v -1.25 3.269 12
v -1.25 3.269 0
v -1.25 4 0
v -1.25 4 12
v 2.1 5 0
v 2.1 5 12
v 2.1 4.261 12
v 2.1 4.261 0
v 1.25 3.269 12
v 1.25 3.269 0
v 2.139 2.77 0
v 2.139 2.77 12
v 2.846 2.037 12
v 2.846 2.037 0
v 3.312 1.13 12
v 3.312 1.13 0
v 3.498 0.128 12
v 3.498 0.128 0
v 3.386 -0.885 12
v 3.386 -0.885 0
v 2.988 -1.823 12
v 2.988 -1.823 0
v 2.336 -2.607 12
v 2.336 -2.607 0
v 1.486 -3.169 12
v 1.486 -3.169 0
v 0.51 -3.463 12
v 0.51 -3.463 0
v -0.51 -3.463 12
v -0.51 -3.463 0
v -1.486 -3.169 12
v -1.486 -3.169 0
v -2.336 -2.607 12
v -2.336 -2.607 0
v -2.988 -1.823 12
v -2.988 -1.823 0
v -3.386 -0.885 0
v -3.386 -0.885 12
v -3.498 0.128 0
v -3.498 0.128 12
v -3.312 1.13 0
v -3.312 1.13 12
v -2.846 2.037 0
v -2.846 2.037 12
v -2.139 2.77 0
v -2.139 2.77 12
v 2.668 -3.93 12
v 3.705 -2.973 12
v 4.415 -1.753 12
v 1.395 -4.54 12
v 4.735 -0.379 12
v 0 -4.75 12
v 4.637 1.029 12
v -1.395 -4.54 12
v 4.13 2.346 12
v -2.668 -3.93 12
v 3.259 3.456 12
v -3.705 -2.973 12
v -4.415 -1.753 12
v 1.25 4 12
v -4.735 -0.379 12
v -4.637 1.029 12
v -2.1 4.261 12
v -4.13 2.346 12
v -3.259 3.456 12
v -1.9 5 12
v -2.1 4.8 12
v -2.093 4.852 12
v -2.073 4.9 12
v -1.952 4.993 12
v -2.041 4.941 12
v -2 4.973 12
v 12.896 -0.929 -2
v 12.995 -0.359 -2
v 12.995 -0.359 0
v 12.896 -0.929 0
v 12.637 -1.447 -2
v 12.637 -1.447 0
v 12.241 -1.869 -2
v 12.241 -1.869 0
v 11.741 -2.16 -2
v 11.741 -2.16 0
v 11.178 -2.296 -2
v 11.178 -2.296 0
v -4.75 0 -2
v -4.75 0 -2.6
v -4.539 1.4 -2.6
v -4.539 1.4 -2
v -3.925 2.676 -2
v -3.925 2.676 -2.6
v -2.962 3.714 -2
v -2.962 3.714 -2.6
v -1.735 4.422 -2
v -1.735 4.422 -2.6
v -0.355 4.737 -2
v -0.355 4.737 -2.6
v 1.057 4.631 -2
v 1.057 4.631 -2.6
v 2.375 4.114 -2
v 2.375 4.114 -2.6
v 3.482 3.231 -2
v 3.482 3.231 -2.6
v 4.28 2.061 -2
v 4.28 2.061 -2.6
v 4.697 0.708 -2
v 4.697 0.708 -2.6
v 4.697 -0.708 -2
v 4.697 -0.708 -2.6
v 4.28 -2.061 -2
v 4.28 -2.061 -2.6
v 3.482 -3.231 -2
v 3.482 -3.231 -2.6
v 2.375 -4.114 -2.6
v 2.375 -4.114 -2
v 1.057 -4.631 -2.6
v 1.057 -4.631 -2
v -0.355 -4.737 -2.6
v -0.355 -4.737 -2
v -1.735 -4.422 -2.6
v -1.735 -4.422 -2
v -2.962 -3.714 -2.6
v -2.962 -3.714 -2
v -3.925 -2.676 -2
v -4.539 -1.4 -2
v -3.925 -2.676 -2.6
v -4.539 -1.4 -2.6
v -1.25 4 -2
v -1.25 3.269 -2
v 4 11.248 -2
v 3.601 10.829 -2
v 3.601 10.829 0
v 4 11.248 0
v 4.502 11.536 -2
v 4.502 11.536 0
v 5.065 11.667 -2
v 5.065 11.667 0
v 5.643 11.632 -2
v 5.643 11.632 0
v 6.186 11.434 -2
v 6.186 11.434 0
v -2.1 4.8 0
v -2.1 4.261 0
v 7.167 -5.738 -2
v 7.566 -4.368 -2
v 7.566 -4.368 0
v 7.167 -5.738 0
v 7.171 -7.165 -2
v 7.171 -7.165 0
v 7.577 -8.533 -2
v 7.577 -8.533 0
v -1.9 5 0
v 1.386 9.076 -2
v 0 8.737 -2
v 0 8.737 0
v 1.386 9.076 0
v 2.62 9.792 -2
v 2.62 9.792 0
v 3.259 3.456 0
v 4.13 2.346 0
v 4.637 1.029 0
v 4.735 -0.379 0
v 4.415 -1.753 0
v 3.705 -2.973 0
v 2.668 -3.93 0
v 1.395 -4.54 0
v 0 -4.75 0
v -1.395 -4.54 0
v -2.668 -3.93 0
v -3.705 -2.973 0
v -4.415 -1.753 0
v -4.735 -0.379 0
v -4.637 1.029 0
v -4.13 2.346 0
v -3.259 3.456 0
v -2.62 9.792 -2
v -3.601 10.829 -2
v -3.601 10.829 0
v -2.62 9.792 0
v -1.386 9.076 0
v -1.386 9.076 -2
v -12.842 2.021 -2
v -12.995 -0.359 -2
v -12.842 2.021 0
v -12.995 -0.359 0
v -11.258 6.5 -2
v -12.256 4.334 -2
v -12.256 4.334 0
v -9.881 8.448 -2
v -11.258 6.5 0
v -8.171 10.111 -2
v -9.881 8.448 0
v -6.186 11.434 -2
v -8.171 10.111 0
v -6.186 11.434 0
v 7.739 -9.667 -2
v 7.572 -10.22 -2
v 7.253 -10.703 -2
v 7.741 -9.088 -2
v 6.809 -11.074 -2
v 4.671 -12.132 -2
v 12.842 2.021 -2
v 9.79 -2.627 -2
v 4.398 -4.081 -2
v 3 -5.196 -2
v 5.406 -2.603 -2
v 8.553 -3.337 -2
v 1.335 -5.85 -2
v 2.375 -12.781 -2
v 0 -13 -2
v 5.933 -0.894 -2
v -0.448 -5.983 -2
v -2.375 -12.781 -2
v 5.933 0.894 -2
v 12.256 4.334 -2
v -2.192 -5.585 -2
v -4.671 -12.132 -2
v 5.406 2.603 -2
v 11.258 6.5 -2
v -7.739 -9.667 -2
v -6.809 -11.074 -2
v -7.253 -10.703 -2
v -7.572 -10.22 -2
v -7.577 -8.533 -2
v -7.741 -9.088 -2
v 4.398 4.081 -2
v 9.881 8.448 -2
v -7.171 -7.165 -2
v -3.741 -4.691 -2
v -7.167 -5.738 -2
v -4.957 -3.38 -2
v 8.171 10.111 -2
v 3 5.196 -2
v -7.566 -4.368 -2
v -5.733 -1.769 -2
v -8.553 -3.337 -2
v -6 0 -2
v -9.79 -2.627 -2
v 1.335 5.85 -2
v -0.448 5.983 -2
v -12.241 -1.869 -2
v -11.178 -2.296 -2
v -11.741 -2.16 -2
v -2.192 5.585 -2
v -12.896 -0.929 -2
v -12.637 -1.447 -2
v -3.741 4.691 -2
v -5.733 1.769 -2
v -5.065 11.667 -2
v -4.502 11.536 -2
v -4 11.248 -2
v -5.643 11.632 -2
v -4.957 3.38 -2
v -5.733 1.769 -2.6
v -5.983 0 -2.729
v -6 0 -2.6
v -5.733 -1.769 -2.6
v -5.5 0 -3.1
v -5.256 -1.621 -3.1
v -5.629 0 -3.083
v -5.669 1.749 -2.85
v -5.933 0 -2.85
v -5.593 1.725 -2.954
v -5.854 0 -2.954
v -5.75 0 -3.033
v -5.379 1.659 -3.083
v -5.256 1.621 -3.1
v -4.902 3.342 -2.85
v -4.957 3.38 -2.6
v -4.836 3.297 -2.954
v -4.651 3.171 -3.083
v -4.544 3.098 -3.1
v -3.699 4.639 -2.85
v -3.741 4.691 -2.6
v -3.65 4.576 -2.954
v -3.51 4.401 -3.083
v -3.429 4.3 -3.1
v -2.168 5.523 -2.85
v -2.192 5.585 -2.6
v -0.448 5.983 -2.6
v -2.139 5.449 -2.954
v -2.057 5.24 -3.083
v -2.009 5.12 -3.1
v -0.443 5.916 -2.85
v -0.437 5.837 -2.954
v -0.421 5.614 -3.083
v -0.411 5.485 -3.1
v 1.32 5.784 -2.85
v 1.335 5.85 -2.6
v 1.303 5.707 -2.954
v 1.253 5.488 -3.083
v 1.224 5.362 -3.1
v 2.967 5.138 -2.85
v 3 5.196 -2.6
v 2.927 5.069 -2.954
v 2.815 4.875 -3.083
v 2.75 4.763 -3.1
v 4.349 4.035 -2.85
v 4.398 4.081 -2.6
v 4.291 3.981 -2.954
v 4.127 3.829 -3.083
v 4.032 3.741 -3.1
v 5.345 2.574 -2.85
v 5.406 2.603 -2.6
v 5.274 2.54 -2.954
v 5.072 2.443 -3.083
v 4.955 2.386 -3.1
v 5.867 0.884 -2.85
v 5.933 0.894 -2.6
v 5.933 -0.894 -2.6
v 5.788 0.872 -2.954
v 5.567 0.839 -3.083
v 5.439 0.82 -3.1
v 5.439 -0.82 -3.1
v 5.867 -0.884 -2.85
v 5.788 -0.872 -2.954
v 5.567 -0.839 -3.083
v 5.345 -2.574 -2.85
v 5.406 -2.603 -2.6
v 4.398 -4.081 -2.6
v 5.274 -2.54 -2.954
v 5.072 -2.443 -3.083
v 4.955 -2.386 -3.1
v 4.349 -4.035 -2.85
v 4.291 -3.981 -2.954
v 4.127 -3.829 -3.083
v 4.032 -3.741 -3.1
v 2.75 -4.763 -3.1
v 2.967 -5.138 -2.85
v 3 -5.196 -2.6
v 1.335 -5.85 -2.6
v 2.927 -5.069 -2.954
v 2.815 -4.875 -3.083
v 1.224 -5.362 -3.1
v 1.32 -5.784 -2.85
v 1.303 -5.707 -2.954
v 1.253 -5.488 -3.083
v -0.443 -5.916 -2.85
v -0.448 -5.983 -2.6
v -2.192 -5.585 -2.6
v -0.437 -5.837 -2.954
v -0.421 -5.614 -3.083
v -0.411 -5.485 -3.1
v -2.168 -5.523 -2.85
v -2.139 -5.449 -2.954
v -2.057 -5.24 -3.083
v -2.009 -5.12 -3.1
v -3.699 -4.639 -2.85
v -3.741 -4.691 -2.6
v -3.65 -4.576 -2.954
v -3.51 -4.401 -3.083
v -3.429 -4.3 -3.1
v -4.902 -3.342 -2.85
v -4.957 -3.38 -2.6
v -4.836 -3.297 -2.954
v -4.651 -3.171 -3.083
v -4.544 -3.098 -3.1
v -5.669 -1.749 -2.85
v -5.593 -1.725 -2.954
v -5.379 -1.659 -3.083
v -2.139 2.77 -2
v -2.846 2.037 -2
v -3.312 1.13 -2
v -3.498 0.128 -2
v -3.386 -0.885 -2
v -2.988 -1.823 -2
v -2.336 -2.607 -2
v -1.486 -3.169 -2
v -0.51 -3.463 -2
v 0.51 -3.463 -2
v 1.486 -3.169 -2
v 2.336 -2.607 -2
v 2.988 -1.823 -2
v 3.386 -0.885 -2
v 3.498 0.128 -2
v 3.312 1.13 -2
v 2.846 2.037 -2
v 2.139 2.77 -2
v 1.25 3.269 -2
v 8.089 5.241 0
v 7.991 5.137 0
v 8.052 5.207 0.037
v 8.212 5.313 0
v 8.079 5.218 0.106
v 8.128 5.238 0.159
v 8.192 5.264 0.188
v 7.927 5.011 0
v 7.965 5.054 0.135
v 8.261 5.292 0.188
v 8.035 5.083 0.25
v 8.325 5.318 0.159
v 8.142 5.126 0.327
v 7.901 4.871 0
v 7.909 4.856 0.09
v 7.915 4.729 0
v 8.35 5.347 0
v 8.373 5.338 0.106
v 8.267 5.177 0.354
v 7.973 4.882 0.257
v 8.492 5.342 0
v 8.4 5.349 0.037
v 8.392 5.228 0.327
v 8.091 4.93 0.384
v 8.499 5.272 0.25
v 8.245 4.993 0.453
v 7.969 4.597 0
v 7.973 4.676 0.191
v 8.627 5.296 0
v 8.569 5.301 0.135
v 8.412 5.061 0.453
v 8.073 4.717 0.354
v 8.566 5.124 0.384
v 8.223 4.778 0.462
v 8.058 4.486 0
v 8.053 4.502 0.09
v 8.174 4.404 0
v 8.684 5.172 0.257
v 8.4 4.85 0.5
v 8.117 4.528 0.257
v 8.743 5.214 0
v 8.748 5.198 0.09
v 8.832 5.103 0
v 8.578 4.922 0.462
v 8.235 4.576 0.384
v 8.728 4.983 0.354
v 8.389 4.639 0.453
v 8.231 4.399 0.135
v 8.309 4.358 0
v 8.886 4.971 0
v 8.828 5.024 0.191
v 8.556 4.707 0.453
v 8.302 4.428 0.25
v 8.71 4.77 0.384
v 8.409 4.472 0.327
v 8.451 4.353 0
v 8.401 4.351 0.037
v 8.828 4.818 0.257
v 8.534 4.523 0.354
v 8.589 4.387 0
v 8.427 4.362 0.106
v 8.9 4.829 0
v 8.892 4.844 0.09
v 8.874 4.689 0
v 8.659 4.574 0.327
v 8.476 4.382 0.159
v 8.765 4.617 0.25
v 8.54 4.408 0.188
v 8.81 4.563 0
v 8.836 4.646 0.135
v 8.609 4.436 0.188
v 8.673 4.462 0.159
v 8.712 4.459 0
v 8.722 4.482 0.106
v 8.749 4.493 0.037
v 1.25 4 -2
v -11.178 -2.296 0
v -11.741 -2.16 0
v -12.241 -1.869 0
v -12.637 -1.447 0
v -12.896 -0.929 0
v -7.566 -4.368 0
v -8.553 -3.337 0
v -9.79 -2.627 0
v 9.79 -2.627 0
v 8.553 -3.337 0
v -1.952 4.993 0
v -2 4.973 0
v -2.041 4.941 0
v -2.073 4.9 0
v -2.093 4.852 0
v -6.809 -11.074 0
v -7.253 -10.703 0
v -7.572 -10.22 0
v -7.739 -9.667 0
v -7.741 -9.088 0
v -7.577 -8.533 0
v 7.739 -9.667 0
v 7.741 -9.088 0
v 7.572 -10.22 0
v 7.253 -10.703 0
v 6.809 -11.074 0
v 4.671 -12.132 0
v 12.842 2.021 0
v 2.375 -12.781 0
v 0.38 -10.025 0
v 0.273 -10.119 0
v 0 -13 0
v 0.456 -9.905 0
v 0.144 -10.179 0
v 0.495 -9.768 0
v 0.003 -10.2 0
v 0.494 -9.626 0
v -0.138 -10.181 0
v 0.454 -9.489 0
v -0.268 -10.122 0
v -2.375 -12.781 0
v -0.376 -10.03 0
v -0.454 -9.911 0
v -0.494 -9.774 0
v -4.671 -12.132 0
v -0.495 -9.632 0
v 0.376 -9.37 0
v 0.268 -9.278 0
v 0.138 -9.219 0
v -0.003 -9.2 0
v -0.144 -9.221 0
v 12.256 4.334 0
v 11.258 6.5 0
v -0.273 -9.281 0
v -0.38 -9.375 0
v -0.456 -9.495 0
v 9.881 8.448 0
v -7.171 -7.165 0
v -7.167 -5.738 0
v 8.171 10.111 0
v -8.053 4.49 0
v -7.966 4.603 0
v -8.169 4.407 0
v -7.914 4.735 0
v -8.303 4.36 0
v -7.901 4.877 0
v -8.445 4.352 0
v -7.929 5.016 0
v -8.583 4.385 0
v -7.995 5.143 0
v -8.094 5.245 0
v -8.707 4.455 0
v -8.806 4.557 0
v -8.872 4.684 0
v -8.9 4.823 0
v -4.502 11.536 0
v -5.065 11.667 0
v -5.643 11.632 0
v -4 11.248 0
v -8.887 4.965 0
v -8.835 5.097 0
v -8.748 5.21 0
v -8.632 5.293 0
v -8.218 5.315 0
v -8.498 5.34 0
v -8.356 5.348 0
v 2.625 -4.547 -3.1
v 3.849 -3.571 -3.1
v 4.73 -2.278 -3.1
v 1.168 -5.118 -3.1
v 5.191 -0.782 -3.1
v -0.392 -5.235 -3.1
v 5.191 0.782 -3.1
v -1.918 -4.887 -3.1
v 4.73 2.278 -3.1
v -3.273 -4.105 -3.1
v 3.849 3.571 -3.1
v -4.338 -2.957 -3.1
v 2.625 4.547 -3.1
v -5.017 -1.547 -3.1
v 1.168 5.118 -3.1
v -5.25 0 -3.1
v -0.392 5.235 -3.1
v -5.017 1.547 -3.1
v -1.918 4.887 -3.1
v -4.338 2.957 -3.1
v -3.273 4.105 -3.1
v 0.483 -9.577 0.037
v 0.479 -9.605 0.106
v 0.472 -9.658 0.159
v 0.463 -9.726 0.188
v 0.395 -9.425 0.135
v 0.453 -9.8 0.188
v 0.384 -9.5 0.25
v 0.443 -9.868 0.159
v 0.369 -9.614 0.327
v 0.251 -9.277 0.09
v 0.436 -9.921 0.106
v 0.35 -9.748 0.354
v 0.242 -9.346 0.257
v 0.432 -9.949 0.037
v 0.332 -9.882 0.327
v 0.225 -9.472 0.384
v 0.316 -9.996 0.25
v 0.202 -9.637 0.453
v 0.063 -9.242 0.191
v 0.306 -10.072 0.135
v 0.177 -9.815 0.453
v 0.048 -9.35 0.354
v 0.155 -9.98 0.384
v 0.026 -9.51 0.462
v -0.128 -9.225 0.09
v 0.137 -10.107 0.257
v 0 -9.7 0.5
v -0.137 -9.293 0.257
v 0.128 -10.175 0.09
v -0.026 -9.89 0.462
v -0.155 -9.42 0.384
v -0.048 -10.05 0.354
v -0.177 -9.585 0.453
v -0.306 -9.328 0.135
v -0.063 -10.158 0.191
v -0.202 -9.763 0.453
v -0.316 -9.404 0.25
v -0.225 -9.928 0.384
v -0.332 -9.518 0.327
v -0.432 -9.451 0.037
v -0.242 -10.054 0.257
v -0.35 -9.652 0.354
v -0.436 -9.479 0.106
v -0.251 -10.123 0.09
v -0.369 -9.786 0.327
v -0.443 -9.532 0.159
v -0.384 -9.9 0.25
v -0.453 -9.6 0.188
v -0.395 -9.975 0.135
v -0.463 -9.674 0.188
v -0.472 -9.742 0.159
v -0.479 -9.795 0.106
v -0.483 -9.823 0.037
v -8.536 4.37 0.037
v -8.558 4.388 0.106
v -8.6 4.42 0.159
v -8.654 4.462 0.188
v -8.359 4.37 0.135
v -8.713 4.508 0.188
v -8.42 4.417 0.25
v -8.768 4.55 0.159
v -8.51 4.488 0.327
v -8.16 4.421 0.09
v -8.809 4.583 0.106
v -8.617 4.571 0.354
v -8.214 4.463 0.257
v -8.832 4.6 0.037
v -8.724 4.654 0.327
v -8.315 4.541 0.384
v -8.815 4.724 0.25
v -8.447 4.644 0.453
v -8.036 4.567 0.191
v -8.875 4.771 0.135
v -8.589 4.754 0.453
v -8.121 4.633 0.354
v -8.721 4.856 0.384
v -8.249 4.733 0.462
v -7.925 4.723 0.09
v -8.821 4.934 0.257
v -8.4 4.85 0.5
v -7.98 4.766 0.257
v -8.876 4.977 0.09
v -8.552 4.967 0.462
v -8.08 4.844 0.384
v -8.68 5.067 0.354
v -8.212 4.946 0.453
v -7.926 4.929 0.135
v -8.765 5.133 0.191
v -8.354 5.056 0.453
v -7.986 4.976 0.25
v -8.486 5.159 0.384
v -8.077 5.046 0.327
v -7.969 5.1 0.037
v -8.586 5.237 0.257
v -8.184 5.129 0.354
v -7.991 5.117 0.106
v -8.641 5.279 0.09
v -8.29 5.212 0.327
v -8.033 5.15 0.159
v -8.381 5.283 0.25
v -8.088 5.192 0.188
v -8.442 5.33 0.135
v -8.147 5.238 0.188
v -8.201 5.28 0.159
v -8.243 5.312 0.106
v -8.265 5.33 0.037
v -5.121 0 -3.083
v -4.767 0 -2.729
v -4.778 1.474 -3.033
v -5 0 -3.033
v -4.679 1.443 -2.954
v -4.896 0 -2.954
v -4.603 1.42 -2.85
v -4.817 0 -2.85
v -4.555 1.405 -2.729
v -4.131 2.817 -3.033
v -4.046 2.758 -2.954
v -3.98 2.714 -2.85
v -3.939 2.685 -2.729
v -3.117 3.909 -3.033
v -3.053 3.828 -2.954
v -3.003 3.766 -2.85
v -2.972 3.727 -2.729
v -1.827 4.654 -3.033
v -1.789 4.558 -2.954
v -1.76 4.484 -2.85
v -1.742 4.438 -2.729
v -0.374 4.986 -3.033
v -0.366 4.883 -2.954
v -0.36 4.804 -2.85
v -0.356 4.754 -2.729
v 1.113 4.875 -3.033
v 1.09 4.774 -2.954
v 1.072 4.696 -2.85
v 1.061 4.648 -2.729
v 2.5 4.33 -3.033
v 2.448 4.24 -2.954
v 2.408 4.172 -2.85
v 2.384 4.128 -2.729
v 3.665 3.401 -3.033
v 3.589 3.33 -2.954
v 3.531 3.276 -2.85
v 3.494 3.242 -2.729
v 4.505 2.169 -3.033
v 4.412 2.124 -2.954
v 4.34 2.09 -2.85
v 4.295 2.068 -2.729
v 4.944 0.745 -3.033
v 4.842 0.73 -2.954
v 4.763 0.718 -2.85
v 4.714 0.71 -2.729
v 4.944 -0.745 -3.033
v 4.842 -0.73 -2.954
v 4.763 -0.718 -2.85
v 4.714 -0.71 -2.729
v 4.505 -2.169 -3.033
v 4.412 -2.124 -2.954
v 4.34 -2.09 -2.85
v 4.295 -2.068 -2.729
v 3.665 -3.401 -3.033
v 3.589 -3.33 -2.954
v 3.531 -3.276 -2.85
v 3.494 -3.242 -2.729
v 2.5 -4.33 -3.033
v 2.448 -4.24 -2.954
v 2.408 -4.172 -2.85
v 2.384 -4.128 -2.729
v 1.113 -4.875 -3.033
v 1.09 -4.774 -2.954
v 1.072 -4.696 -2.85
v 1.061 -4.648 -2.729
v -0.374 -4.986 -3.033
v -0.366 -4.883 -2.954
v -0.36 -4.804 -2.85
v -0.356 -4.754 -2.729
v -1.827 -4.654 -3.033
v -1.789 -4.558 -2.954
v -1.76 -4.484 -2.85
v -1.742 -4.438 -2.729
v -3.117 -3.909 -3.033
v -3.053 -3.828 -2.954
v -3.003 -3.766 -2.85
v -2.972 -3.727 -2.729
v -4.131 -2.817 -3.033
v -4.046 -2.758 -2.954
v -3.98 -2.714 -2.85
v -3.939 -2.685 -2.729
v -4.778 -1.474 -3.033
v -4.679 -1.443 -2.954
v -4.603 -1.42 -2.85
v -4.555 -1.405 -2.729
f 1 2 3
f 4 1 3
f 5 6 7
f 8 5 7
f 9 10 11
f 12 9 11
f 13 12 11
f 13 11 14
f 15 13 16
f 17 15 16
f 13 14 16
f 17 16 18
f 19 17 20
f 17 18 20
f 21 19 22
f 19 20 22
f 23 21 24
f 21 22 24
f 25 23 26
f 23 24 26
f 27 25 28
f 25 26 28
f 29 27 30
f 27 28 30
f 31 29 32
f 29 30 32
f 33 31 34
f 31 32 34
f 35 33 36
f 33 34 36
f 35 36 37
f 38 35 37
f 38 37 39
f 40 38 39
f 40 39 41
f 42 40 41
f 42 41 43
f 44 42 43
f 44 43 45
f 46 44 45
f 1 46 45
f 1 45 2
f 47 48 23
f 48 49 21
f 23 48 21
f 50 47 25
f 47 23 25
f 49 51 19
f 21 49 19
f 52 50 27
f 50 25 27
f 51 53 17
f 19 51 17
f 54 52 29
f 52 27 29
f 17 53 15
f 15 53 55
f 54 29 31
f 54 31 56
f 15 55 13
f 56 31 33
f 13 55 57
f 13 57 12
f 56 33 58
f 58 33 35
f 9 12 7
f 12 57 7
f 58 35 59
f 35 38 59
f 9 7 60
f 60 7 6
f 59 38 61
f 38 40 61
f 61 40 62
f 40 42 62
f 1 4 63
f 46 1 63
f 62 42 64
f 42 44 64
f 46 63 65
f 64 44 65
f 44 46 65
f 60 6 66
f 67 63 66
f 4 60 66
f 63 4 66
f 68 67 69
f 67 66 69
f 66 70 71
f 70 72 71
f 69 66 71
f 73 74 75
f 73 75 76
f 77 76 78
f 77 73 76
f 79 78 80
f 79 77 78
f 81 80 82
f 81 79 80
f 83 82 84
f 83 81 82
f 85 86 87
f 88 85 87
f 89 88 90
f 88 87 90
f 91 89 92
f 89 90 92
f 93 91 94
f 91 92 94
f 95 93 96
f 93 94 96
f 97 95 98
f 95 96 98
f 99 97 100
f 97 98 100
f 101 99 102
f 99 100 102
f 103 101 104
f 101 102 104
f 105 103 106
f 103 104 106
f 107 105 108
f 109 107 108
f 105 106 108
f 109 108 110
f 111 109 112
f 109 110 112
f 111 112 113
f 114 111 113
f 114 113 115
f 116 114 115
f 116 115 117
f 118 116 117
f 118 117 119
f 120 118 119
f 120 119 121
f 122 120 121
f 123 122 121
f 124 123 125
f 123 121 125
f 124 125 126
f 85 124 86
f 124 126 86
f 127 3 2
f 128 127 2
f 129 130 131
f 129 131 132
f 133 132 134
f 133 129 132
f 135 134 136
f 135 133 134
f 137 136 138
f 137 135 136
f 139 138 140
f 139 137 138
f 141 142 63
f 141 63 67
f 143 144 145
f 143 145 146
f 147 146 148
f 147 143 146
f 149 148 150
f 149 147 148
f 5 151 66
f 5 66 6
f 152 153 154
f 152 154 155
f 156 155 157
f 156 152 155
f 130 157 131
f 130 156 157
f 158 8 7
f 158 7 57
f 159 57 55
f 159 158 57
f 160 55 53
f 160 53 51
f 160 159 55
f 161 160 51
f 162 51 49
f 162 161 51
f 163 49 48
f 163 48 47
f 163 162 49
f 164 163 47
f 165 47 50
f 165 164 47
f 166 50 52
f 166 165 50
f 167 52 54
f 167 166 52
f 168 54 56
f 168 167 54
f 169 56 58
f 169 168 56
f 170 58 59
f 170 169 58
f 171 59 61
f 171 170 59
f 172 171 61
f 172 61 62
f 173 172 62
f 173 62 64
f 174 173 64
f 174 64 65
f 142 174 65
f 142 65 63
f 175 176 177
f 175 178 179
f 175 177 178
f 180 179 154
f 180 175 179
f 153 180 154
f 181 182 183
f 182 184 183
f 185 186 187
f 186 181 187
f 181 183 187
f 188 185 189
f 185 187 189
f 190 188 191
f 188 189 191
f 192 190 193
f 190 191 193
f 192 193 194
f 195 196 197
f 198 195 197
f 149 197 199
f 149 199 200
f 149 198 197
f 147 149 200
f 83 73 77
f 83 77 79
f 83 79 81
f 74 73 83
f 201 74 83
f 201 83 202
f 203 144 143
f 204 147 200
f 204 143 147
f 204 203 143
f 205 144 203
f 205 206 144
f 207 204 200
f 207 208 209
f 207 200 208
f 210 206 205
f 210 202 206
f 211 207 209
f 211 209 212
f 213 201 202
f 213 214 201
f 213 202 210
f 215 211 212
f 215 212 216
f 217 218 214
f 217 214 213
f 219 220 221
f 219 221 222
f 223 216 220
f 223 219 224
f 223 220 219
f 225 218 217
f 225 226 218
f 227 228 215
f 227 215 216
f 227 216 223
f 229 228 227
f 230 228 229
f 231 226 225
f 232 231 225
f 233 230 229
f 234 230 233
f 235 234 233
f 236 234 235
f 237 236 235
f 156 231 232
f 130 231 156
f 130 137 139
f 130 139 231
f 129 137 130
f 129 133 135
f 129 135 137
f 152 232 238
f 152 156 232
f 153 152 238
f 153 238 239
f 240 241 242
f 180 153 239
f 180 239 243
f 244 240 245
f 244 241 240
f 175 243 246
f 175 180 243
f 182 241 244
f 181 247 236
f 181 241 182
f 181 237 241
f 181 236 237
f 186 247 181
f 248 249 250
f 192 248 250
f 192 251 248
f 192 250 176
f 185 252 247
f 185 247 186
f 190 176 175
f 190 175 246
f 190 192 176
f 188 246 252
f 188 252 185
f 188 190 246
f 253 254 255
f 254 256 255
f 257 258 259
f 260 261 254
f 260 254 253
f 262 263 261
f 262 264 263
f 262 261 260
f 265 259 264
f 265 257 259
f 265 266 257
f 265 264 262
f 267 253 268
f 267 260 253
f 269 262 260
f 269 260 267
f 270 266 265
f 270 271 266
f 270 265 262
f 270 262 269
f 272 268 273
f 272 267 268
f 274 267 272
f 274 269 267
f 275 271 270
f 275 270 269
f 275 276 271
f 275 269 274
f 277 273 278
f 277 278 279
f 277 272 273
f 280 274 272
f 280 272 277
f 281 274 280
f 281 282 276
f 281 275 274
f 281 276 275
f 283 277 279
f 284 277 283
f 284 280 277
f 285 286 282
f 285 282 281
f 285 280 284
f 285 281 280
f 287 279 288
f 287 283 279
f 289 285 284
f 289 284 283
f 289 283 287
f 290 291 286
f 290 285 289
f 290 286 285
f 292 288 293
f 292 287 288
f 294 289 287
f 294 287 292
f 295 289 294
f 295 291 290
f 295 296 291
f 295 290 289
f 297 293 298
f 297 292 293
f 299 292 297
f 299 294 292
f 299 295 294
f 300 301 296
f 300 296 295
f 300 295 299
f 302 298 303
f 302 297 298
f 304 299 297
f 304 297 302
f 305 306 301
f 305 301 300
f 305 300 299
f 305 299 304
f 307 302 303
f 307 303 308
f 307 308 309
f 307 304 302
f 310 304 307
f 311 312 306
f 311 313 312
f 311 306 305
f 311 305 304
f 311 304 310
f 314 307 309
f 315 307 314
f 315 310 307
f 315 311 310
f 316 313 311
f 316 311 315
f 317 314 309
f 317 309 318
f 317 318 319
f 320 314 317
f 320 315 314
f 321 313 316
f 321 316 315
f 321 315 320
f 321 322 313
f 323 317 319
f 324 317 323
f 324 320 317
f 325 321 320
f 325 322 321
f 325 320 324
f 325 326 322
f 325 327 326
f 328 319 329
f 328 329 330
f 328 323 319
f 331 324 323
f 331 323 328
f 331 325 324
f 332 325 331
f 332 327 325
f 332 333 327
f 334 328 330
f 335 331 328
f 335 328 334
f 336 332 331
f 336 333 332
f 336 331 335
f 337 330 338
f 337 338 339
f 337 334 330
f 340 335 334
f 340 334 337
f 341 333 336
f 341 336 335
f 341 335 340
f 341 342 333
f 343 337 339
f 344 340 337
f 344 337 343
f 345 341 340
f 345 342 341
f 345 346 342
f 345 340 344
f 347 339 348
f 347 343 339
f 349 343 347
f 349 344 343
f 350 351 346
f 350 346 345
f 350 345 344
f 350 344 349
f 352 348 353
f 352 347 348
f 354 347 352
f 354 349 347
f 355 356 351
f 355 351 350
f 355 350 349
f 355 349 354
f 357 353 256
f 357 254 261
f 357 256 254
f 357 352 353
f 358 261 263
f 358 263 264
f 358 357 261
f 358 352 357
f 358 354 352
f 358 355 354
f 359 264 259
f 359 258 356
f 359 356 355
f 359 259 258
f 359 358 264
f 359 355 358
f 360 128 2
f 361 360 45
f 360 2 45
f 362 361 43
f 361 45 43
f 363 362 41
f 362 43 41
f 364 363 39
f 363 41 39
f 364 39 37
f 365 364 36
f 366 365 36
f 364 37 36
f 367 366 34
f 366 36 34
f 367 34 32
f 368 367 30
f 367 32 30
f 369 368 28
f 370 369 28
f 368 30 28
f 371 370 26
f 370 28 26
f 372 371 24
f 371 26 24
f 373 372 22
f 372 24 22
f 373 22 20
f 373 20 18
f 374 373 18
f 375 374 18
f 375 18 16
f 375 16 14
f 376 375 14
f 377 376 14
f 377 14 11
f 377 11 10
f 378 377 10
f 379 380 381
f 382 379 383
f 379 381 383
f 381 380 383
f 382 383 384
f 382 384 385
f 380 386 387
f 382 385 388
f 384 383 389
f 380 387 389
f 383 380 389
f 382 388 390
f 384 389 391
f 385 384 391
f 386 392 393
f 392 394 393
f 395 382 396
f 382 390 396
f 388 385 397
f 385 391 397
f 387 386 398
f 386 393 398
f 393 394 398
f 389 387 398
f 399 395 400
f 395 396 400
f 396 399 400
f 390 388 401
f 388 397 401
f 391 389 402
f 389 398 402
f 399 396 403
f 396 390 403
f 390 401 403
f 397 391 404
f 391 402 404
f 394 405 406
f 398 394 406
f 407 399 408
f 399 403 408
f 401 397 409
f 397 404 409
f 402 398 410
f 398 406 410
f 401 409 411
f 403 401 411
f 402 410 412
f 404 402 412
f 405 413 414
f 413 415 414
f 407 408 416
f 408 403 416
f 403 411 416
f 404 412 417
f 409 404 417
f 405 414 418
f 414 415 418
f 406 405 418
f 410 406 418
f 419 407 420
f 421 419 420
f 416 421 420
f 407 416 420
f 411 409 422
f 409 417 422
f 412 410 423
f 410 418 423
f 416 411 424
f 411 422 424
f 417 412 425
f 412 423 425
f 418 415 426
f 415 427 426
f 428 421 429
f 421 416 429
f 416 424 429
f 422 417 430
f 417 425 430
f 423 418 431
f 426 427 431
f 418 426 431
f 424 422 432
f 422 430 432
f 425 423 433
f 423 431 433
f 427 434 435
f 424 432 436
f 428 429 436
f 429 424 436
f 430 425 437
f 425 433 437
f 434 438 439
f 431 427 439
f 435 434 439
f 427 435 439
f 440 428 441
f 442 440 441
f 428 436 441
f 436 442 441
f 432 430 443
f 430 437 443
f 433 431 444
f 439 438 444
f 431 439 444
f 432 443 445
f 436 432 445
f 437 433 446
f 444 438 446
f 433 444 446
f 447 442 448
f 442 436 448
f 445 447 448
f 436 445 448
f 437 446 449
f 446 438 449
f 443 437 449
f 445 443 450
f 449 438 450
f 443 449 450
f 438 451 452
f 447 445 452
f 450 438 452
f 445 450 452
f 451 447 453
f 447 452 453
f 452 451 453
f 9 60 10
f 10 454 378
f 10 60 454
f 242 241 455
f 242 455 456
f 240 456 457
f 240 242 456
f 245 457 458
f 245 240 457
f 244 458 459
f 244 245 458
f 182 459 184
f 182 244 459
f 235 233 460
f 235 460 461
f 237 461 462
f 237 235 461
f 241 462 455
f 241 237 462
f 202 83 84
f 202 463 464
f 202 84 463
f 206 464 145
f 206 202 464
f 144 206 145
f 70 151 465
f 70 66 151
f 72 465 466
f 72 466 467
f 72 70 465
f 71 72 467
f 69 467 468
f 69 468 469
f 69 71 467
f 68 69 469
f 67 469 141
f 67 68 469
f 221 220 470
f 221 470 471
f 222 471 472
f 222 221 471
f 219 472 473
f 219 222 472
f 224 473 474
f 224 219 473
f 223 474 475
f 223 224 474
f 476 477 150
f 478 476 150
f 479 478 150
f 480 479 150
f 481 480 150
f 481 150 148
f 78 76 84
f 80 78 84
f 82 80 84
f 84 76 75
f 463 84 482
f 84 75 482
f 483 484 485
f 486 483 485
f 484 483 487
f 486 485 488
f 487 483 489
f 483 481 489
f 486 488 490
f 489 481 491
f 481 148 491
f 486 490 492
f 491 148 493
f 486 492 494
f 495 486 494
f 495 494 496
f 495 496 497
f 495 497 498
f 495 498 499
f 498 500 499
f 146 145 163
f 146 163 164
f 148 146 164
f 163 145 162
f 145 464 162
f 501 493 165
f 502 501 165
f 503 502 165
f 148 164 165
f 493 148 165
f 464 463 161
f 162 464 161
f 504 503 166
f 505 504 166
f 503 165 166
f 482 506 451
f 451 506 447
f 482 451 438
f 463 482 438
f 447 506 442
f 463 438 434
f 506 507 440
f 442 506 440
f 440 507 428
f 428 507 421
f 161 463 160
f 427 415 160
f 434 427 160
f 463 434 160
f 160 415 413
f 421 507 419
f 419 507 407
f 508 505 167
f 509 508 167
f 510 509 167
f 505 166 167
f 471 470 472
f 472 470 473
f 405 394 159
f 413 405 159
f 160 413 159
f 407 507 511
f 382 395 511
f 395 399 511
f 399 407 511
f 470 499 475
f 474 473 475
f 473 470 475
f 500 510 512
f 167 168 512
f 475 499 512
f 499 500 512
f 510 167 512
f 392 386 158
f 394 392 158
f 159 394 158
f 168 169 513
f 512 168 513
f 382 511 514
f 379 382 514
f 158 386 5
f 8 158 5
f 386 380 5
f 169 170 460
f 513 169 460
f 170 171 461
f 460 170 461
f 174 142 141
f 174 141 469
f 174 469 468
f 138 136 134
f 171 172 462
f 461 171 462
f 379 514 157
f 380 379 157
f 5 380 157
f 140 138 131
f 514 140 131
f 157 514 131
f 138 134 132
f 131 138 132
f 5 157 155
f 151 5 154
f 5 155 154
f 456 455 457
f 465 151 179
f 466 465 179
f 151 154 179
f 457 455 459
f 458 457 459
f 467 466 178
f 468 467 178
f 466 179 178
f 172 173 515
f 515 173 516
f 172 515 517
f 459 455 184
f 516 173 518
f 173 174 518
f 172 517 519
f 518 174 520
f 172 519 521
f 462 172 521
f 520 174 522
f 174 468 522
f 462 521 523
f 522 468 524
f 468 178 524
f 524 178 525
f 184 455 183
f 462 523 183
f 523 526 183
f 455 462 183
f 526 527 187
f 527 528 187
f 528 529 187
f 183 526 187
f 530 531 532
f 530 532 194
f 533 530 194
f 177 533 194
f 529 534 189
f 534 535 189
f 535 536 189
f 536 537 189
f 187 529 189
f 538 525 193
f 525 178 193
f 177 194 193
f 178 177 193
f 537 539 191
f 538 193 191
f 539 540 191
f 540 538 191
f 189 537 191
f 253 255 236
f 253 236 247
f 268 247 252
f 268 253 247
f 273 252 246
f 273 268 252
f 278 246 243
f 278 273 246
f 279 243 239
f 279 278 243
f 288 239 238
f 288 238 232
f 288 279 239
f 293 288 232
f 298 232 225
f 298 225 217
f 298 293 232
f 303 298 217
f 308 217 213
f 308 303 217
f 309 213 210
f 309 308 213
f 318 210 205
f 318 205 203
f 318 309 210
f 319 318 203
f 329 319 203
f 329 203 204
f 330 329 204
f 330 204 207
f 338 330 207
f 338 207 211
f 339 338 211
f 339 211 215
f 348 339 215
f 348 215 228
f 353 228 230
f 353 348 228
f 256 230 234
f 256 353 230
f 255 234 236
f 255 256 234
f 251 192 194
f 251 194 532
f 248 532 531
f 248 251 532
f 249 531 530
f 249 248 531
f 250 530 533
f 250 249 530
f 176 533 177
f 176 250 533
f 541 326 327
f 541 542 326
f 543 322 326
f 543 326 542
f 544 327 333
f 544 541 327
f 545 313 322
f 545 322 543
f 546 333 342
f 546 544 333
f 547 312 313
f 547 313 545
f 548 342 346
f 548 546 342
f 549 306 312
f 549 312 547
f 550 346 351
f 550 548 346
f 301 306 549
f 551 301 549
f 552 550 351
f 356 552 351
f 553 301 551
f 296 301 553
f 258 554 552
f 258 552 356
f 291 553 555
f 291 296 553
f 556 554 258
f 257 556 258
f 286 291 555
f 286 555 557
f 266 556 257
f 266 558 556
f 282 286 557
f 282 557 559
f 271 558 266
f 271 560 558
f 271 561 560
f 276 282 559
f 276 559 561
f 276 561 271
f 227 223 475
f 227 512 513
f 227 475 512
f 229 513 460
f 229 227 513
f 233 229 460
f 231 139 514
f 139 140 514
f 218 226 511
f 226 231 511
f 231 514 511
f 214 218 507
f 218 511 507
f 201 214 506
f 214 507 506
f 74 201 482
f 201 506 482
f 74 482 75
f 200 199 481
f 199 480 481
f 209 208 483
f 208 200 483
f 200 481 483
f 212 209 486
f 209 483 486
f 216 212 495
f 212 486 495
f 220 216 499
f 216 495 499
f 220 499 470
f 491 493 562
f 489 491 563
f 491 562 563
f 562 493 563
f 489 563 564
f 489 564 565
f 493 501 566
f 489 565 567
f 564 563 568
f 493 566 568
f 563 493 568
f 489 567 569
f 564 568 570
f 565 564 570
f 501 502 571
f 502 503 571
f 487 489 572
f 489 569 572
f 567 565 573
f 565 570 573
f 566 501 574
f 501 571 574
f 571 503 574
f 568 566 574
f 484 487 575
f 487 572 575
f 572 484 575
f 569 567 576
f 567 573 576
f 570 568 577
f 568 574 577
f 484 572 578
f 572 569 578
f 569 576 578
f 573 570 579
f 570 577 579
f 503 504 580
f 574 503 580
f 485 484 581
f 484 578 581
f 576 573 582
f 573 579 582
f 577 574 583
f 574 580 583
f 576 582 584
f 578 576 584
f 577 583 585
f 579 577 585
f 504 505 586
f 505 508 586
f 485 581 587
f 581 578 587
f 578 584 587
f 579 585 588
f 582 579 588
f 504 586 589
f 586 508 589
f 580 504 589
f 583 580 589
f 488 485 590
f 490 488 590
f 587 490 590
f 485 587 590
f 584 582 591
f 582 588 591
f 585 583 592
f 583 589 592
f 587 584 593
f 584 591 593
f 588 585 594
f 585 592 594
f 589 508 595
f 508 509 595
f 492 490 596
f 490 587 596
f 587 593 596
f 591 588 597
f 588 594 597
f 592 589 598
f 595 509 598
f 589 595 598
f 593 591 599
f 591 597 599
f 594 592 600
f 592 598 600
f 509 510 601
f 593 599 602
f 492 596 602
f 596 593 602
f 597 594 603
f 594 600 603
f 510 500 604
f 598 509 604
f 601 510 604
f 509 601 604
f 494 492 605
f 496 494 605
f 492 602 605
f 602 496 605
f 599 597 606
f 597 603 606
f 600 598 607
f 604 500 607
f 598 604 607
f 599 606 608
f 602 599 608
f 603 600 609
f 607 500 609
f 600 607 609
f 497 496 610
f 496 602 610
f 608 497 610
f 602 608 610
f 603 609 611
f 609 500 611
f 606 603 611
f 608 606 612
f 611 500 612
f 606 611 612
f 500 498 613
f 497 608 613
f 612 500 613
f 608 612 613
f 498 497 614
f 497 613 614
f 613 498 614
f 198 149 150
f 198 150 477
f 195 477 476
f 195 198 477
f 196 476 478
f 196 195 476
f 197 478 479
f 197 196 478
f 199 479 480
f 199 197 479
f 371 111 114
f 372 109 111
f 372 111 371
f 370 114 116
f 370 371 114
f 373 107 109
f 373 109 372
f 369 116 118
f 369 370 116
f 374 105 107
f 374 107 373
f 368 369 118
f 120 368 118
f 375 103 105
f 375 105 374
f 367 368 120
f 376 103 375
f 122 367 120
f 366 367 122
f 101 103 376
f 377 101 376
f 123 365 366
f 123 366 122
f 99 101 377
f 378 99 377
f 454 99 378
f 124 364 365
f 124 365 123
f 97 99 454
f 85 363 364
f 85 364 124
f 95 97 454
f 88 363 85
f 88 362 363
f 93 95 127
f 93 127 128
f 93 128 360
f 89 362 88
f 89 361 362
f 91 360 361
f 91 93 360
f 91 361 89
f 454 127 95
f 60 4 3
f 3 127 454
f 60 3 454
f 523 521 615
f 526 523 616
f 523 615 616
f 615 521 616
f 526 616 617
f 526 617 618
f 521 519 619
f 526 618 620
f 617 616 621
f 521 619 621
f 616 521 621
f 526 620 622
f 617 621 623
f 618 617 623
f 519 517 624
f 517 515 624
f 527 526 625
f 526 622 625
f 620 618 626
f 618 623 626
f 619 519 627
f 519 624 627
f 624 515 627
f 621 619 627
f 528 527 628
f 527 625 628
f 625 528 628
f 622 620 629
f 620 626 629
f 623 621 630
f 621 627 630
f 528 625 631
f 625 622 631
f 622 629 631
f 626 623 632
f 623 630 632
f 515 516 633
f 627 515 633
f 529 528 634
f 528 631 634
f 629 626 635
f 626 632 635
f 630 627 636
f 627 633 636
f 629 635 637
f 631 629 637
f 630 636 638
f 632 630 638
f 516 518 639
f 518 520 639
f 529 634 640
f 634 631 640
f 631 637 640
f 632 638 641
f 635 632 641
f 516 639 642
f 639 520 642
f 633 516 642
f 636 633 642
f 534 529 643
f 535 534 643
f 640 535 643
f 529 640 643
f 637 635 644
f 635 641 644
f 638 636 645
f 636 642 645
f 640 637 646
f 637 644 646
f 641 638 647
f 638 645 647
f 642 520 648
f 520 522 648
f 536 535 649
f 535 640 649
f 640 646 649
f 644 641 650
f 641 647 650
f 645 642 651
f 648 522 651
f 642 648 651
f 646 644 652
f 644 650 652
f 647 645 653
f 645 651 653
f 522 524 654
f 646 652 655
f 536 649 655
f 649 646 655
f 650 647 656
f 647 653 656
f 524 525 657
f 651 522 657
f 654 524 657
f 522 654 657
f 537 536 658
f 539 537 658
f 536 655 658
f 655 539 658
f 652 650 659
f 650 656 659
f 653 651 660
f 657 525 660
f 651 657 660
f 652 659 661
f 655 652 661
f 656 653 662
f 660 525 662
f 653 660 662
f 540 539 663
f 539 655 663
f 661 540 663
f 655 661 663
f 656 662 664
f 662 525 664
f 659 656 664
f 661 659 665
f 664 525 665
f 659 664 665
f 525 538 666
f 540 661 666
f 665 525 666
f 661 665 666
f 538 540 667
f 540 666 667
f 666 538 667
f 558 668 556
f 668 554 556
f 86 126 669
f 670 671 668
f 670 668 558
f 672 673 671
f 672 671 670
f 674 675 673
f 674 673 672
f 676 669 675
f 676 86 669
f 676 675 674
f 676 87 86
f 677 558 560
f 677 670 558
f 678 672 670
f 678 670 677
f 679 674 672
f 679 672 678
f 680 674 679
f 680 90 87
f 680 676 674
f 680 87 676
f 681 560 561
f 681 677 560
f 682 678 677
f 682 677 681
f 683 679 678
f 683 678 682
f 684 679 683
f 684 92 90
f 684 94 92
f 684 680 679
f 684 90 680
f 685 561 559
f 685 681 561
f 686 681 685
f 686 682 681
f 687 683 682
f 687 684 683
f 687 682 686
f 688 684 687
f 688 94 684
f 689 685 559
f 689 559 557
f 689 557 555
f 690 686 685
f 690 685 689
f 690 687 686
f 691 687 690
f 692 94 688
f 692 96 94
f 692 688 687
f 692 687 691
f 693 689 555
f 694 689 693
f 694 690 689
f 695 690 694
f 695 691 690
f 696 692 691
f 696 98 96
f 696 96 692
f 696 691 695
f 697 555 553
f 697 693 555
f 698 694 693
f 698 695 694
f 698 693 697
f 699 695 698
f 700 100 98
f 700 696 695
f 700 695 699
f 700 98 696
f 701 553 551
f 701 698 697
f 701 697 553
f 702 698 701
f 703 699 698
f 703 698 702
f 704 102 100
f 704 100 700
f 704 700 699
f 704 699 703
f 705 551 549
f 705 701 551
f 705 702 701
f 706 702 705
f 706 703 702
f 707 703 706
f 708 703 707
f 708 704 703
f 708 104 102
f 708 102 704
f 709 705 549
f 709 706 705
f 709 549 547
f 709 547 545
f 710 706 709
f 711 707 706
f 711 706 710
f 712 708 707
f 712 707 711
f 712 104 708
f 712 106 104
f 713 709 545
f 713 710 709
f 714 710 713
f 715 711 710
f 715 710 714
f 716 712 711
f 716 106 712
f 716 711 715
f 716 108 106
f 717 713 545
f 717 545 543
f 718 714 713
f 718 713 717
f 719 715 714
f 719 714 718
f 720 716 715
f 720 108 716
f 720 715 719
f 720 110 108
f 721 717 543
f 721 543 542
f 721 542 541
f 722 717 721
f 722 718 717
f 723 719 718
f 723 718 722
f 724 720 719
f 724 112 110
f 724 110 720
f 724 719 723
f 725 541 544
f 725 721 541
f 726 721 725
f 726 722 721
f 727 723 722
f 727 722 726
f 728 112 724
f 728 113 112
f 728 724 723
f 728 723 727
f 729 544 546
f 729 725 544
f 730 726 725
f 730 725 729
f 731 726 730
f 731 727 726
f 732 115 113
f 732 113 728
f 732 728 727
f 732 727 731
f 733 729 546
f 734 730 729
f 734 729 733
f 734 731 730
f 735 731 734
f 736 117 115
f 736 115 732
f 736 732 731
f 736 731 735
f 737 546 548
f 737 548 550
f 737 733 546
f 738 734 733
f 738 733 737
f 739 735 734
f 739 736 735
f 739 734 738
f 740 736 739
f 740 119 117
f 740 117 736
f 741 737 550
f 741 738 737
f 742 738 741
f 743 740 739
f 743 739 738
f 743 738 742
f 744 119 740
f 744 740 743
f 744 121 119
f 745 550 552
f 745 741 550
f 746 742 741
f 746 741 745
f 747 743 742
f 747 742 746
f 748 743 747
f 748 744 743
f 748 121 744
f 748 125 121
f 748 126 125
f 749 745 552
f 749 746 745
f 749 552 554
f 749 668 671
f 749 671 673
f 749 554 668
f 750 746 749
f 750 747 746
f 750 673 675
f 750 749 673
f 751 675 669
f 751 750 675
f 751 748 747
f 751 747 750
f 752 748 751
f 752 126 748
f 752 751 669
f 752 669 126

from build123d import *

# Parameters (mm, degrees)
BOSS_EXTRU_1_DEPTH           = 12
ESQUISSE3_R                  = 13
BOSS_EXTRU_5_DEPTH           = 2
BOSS_EXTRU_6_START           = 1.1
ESQUISSE4_R                  = 6
ESQUISSE4_R_2                = 4.75
BOSS_EXTRU_6_DEPTH           = 1.1
ENL_V_MAT_EXTRU_2_REACH      = 23.954
CONG_1_R                     = 0.5
CONG_2_R                     = 0.5
ENL_V_MAT_EXTRU_3_REACH      = 25.108
R_P_TITION_CIRCULAIRE1_COUNT = 2
R_P_TITION_CIRCULAIRE1_ANGLE = 120
R_P_TITION_CIRCULAIRE2_COUNT = 2
R_P_TITION_CIRCULAIRE2_ANGLE = 240
CONG_3_R                     = 0.2
R_P_TITION_CIRCULAIRE3_COUNT = 2
R_P_TITION_CIRCULAIRE3_ANGLE = 240
R_P_TITION_CIRCULAIRE4_COUNT = 2
R_P_TITION_CIRCULAIRE4_ANGLE = 120


with BuildPart() as part:
    # Esquisse1 → Boss.-Extru.1 (new body)
    with BuildSketch(Plane.XY):
        with BuildLine():
            Line((-2.1, 5), (2.1, 5))
            Line((2.1, 5), (2.1, 4.260575079))
            ThreePointArc((2.1, 4.260575079), (0, -4.75), (-2.1, 4.260575079))
            Line((-2.1, 4.260575079), (-2.1, 5))
        make_face()
        with BuildLine():
            Line((-1.25, 4), (1.25, 4))
            Line((1.25, 4), (1.25, 3.269174208))
            ThreePointArc((1.25, 3.269174208), (0, -3.5), (-1.25, 3.269174208))
            Line((-1.25, 3.269174208), (-1.25, 4))
        make_face(mode=Mode.SUBTRACT)
    extrude(amount=BOSS_EXTRU_1_DEPTH)

    # Esquisse3 → Boss.-Extru.5 (add)
    with BuildSketch(Plane(origin=(0, 0, 0), x_dir=(-1, 0, 0), z_dir=(0, 0, -1))):
        Circle(ESQUISSE3_R)
    extrude(amount=BOSS_EXTRU_5_DEPTH)

    # Esquisse4 → Boss.-Extru.6 (add)
    with BuildSketch(Plane(origin=(0, 0, -2), x_dir=(-1, 0, 0), z_dir=(0, 0, -1)).offset(BOSS_EXTRU_6_START)):
        Circle(ESQUISSE4_R)
        Circle(ESQUISSE4_R_2, mode=Mode.SUBTRACT)
    extrude(amount=-BOSS_EXTRU_6_DEPTH)

    # Esquisse5 → Enlèv. mat.-Extru.2 (cut, up to next)
    with BuildSketch(Plane.XY, mode=Mode.PRIVATE) as enl_v_mat_extru_2_sk1:
        with BuildLine():
            Line((1.25, 4), (-1.25, 4))
            Line((-1.25, 4), (-1.25, 3.269174208))
            ThreePointArc((-1.25, 3.269174208), (0, -3.5), (1.25, 3.269174208))
            Line((1.25, 3.269174208), (1.25, 4))
        make_face()
    enl_v_mat_extru_2_tool1 = extrude(enl_v_mat_extru_2_sk1.sketch, amount=-ENL_V_MAT_EXTRU_2_REACH, mode=Mode.PRIVATE) & part.part
    add(enl_v_mat_extru_2_tool1.solids().sort_by_distance((0, 0.133717, 0))[0], mode=Mode.SUBTRACT)

    # Congé1
    cong_1_edges = [part.edges().sort_by_distance(p)[0] for p in [
        (6, 0, -3.1),
    ]]
    fillet(cong_1_edges, radius=CONG_1_R)

    # Congé2
    cong_2_edges = [part.edges().sort_by_distance(p)[0] for p in [
        (4.75, 0, -3.1),
    ]]
    fillet(cong_2_edges, radius=CONG_2_R)

    # Esquisse6 → Enlèv. mat.-Extru.3 (cut, up to next)
    with BuildSketch(Plane(origin=(0, 0, -2), x_dir=(-1, 0, 0), z_dir=(0, 0, -1)), mode=Mode.PRIVATE) as enl_v_mat_extru_3_sk1:
        with BuildLine():
            ThreePointArc((3.60109047, 10.828515139), (2.028708414, 9.38979217), (0, 8.736606683))
            ThreePointArc((0, 8.736606683), (-2.028708414, 9.38979217), (-3.60109047, 10.828515139))
            ThreePointArc((-3.60109047, 10.828515139), (-4.778846502, 11.621991896), (-6.186412192, 11.433647895))
            ThreePointArc((-6.186412192, 11.433647895), (0, 13), (6.186412192, 11.433647895))
            ThreePointArc((6.186412192, 11.433647895), (4.778846502, 11.621991896), (3.60109047, 10.828515139))
        make_face()
    enl_v_mat_extru_3_tool1 = extrude(enl_v_mat_extru_3_sk1.sketch, amount=-ENL_V_MAT_EXTRU_3_REACH, mode=Mode.PRIVATE) & part.part
    enl_v_mat_extru_3 = enl_v_mat_extru_3_tool1.solids().sort_by_distance((0, 11.154072, -2))[0]
    add(enl_v_mat_extru_3, mode=Mode.SUBTRACT)

    # Esquisse7 → Révolution2 (revolve)
    with BuildSketch(Plane.XY):
        with BuildLine():
            Line((-0.495343696, -9.631921937), (0.495343696, -9.768078063))
            ThreePointArc((0.495343696, -9.768078063), (0.068078063, -9.204656304), (-0.495343696, -9.631921937))
        make_face()
    r_volution2 = revolve(axis=Axis((-0.495343696, -9.631921937, 0), (0.9906873922487173, -0.1361561267054709, 0)))

    # Répétition circulaire1: Révolution2 ×2 about axis
    r_p_tition_circulaire1_axis = Axis((0, 0, 0), (0, 0, -1))
    for i in range(1, R_P_TITION_CIRCULAIRE1_COUNT):
        add(r_volution2.rotate(r_p_tition_circulaire1_axis, i * R_P_TITION_CIRCULAIRE1_ANGLE / (R_P_TITION_CIRCULAIRE1_COUNT - 1)))

    # Répétition circulaire2: Révolution2 ×2 about axis
    r_p_tition_circulaire2_axis = Axis((0, 0, 0), (0, 0, -1))
    for i in range(1, R_P_TITION_CIRCULAIRE2_COUNT):
        add(r_volution2.rotate(r_p_tition_circulaire2_axis, i * R_P_TITION_CIRCULAIRE2_ANGLE / (R_P_TITION_CIRCULAIRE2_COUNT - 1)))

    # Congé3
    cong_3_edges = [part.edges().sort_by_distance(p)[0] for p in [
        (-2.1, 5, 6),
    ]]
    fillet(cong_3_edges, radius=CONG_3_R)

    # Répétition circulaire3: Enlèv. mat.-Extru.3 ×2 about axis
    r_p_tition_circulaire3_axis = Axis((0, 0, 0), (0, 0, -1))
    for i in range(1, R_P_TITION_CIRCULAIRE3_COUNT):
        add(enl_v_mat_extru_3.rotate(r_p_tition_circulaire3_axis, i * R_P_TITION_CIRCULAIRE3_ANGLE / (R_P_TITION_CIRCULAIRE3_COUNT - 1)), mode=Mode.SUBTRACT)

    # Répétition circulaire4: Enlèv. mat.-Extru.3 ×2 about axis
    r_p_tition_circulaire4_axis = Axis((0, 0, 0), (0, 0, -1))
    for i in range(1, R_P_TITION_CIRCULAIRE4_COUNT):
        add(enl_v_mat_extru_3.rotate(r_p_tition_circulaire4_axis, i * R_P_TITION_CIRCULAIRE4_ANGLE / (R_P_TITION_CIRCULAIRE4_COUNT - 1)), mode=Mode.SUBTRACT)


solid = part.part
